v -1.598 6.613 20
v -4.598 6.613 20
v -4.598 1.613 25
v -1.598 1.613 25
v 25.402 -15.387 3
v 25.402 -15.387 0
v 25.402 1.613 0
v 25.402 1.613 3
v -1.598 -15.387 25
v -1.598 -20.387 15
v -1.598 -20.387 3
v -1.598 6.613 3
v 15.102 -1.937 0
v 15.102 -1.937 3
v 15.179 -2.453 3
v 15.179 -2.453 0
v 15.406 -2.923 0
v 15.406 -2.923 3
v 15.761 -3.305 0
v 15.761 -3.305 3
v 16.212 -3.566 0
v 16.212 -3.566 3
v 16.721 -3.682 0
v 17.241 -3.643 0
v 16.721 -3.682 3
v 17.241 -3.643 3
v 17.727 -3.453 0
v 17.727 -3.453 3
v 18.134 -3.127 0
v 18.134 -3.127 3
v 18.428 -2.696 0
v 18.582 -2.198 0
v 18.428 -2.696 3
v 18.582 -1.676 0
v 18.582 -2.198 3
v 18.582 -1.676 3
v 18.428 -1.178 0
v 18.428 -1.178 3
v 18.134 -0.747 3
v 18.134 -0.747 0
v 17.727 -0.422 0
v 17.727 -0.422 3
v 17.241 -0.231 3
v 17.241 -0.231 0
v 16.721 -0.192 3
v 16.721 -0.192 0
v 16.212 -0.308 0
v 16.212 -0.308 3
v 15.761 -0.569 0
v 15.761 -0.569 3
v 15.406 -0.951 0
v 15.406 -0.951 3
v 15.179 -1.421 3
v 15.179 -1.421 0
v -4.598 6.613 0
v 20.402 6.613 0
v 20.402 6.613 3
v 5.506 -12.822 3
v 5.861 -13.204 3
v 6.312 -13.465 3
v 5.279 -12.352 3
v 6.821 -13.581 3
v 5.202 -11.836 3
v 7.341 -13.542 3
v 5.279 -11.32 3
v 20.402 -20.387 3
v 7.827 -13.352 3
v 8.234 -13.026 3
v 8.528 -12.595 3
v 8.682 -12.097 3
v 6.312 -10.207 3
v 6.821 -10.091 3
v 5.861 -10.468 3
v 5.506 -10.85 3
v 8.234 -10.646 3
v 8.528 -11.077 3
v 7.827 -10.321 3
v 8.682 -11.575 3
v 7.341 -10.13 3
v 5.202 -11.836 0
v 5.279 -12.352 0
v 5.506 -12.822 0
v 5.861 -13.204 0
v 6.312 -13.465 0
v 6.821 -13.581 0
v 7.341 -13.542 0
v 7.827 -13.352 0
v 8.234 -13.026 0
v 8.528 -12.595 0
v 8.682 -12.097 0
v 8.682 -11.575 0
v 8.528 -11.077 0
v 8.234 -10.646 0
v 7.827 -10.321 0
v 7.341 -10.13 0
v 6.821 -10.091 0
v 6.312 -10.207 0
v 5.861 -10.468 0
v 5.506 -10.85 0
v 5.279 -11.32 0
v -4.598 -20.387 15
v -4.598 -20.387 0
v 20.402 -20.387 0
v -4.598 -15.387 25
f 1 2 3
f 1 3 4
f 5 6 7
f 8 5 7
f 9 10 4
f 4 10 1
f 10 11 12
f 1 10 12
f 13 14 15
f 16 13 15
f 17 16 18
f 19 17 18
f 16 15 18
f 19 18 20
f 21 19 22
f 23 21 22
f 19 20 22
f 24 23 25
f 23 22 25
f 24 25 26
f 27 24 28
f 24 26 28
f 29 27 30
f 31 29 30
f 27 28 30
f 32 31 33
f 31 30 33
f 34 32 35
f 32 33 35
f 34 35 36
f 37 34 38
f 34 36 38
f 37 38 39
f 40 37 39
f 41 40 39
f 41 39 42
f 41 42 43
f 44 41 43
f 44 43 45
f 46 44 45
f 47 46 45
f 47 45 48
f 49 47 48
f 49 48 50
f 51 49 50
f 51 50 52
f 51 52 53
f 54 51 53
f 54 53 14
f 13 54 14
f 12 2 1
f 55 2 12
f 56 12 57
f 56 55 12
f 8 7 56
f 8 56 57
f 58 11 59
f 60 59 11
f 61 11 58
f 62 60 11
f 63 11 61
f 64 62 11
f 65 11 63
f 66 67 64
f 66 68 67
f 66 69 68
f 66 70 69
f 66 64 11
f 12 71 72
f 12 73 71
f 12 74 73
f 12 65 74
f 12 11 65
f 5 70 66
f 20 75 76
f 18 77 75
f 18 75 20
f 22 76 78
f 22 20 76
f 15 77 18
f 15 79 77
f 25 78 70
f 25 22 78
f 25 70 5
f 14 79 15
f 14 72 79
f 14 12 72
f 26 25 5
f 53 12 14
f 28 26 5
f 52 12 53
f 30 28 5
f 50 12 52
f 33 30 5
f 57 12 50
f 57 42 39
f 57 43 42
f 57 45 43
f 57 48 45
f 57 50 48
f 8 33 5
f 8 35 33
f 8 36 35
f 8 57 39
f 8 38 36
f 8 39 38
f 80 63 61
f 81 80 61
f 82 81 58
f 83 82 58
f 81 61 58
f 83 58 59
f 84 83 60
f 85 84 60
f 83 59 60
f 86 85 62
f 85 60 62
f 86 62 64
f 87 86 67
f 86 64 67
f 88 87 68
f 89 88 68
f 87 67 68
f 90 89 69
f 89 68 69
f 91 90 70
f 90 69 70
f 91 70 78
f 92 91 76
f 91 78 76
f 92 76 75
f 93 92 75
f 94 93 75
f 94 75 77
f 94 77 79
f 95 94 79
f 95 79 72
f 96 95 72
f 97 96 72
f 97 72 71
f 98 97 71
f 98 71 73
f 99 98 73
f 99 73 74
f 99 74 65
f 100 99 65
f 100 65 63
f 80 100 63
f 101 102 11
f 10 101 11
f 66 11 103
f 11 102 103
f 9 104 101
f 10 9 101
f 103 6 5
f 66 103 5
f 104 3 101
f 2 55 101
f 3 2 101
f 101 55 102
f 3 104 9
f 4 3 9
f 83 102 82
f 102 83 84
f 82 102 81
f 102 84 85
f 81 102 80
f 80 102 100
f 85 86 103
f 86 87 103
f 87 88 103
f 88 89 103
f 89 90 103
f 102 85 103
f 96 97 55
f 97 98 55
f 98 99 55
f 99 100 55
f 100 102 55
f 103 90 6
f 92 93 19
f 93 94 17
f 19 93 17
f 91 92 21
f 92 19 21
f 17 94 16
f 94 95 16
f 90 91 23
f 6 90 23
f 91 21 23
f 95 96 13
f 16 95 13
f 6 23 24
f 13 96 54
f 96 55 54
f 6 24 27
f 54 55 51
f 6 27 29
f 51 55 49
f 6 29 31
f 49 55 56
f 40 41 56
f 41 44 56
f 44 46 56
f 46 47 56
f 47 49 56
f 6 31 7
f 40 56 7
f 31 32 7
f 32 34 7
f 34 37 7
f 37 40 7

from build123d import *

# Parameters (mm, degrees)
F0_W     = 9.9
F0_H     = 4.9494949237
F1_DEPTH = 3
F0_W_2   = 3
F0_H_2   = 13.5
F2_DEPTH = 25
F3_D     = 3.5
F3_DEPTH = 12.4
F3_TIP   = 1.0515060833
F5_DEPTH = 30.001
F6_SIZE  = 5


# Not quite as in the source:
# - a feature names something its author has since deleted; it is built from what else it names


with BuildPart() as f1:
    # F0 (on Top) → F1 (new body)
    with BuildSketch(Plane.XY):
        with BuildLine():
            Line((25.4016518593, 6.6133860946), (-1.5983481407, 6.6133860946))
            Line((-1.5983481407, 6.6133860946), (-1.5983481407, -6.8866139054))
            Line((-1.5983481407, -6.8866139054), (4.9016518593, -6.8866139054))
            ThreePointArc((4.9016518593, -6.8866139054), (5.4344267975, -4.2079948582), (6.9516518593, -1.9371189817))
            ThreePointArc((6.9516518593, -1.9371189817), (11.9016518593, 0.1133860946), (16.8516518593, -1.9371189817))
            ThreePointArc((16.8516518593, -1.9371189817), (18.3688769211, -4.2079948582), (18.9016518593, -6.8866139054))
            Line((18.9016518593, -6.8866139054), (25.4016518593, -6.8866139054))
            Line((25.4016518593, -6.8866139054), (25.4016518593, 6.6133860946))
        make_face()
        with BuildLine():
            Line((4.9016518593, -6.8866139054), (-1.5983481407, -6.8866139054))
            Line((-1.5983481407, -6.8866139054), (-1.5983481407, -20.3866139054))
            Line((-1.5983481407, -20.3866139054), (25.4016518593, -20.3866139054))
            Line((25.4016518593, -20.3866139054), (25.4016518593, -6.8866139054))
            Line((25.4016518593, -6.8866139054), (18.9016518593, -6.8866139054))
            ThreePointArc((18.9016518593, -6.8866139054), (18.3688769211, -9.5652329526), (16.8516518593, -11.8361088292))
            ThreePointArc((16.8516518593, -11.8361088292), (11.9016518593, -13.8866139054), (6.9516518593, -11.8361088292))
            ThreePointArc((6.9516518593, -11.8361088292), (5.4344267975, -9.5652329526), (4.9016518593, -6.8866139054))
        make_face()
        with BuildLine():
            ThreePointArc((16.8516518593, -1.9371189817), (11.9016518593, 0.1133860946), (6.9516518593, -1.9371189817))
            Line((6.9516518593, -1.9371189817), (16.8516518593, -1.9371189817))
        make_face()
        with BuildLine():
            ThreePointArc((6.9516518593, -1.9371189817), (5.4344267975, -4.2079948582), (4.9016518593, -6.8866139054))
            Line((4.9016518593, -6.8866139054), (6.9516518593, -6.8866139054))
            Line((6.9516518593, -6.8866139054), (6.9516518593, -1.9371189817))
        make_face()
        with Locations((11.9016518593, -4.4118664436)):
            Rectangle(F0_W, F0_H)
        with BuildLine():
            Line((16.8516518593, -6.8866139054), (18.9016518593, -6.8866139054))
            ThreePointArc((18.9016518593, -6.8866139054), (18.3688769211, -4.2079948582), (16.8516518593, -1.9371189817))
            Line((16.8516518593, -1.9371189817), (16.8516518593, -6.8866139054))
        make_face()
        with BuildLine():
            ThreePointArc((16.8516518593, -11.8361088292), (18.3688769211, -9.5652329526), (18.9016518593, -6.8866139054))
            Line((18.9016518593, -6.8866139054), (16.8516518593, -6.8866139054))
            Line((16.8516518593, -6.8866139054), (16.8516518593, -11.8361088292))
        make_face()
        with Locations((11.9016518593, -9.3613613673)):
            Rectangle(F0_W, F0_H)
        with BuildLine():
            Line((6.9516518593, -6.8866139054), (4.9016518593, -6.8866139054))
            ThreePointArc((4.9016518593, -6.8866139054), (5.4344267975, -9.5652329526), (6.9516518593, -11.8361088292))
            Line((6.9516518593, -11.8361088292), (6.9516518593, -6.8866139054))
        make_face()
        with BuildLine():
            Line((16.8516518593, -11.8361088292), (6.9516518593, -11.8361088292))
            ThreePointArc((6.9516518593, -11.8361088292), (11.9016518593, -13.8866139054), (16.8516518593, -11.8361088292))
        make_face()
    extrude(amount=F1_DEPTH)

    # F0 (on Top) → F2 (join)
    with BuildSketch(Plane.XY):
        with Locations((-3.0983481407, -0.1366139054)):
            Rectangle(F0_W_2, F0_H_2)
        with Locations((-3.0983481407, -13.6366139054)):
            Rectangle(F0_W_2, F0_H_2)
    extrude(amount=F2_DEPTH)

    # F3
    with Locations(Plane(origin=(0, 0, 0), x_dir=(1, 0, 0), z_dir=(0, 0, -1))):
        with Locations((16.8516518593, 1.9371189817), (6.9516518593, 11.8361088292)):
            Hole(F3_D / 2, depth=F3_DEPTH)
            with Locations((0, 0, -(F3_DEPTH + F3_TIP / 2))):  # 118° drill point
                Cone(0, F3_D / 2, F3_TIP, mode=Mode.SUBTRACT)

    # F4 (on face) → F5 (cut, through all)
    with BuildSketch(Plane(origin=(-4.5983481407, 0, 0), x_dir=(0, -1, 0), z_dir=(-1, 0, 0))):
        Polygon((20.3866139054, 25), (15.3866139054, 25), (20.3866139054, 15), align=None)
    extrude(amount=-F5_DEPTH, mode=Mode.SUBTRACT)

    # F6
    f6_edges = [f1.edges().sort_by_distance(p)[0] for p in [
        (25.401652, -20.386614, 1.5),
        (25.401652, 6.613386, 1.5),
        (-3.098348, 6.613386, 25),
    ]]
    chamfer(f6_edges, length=F6_SIZE)


solid = f1.part
